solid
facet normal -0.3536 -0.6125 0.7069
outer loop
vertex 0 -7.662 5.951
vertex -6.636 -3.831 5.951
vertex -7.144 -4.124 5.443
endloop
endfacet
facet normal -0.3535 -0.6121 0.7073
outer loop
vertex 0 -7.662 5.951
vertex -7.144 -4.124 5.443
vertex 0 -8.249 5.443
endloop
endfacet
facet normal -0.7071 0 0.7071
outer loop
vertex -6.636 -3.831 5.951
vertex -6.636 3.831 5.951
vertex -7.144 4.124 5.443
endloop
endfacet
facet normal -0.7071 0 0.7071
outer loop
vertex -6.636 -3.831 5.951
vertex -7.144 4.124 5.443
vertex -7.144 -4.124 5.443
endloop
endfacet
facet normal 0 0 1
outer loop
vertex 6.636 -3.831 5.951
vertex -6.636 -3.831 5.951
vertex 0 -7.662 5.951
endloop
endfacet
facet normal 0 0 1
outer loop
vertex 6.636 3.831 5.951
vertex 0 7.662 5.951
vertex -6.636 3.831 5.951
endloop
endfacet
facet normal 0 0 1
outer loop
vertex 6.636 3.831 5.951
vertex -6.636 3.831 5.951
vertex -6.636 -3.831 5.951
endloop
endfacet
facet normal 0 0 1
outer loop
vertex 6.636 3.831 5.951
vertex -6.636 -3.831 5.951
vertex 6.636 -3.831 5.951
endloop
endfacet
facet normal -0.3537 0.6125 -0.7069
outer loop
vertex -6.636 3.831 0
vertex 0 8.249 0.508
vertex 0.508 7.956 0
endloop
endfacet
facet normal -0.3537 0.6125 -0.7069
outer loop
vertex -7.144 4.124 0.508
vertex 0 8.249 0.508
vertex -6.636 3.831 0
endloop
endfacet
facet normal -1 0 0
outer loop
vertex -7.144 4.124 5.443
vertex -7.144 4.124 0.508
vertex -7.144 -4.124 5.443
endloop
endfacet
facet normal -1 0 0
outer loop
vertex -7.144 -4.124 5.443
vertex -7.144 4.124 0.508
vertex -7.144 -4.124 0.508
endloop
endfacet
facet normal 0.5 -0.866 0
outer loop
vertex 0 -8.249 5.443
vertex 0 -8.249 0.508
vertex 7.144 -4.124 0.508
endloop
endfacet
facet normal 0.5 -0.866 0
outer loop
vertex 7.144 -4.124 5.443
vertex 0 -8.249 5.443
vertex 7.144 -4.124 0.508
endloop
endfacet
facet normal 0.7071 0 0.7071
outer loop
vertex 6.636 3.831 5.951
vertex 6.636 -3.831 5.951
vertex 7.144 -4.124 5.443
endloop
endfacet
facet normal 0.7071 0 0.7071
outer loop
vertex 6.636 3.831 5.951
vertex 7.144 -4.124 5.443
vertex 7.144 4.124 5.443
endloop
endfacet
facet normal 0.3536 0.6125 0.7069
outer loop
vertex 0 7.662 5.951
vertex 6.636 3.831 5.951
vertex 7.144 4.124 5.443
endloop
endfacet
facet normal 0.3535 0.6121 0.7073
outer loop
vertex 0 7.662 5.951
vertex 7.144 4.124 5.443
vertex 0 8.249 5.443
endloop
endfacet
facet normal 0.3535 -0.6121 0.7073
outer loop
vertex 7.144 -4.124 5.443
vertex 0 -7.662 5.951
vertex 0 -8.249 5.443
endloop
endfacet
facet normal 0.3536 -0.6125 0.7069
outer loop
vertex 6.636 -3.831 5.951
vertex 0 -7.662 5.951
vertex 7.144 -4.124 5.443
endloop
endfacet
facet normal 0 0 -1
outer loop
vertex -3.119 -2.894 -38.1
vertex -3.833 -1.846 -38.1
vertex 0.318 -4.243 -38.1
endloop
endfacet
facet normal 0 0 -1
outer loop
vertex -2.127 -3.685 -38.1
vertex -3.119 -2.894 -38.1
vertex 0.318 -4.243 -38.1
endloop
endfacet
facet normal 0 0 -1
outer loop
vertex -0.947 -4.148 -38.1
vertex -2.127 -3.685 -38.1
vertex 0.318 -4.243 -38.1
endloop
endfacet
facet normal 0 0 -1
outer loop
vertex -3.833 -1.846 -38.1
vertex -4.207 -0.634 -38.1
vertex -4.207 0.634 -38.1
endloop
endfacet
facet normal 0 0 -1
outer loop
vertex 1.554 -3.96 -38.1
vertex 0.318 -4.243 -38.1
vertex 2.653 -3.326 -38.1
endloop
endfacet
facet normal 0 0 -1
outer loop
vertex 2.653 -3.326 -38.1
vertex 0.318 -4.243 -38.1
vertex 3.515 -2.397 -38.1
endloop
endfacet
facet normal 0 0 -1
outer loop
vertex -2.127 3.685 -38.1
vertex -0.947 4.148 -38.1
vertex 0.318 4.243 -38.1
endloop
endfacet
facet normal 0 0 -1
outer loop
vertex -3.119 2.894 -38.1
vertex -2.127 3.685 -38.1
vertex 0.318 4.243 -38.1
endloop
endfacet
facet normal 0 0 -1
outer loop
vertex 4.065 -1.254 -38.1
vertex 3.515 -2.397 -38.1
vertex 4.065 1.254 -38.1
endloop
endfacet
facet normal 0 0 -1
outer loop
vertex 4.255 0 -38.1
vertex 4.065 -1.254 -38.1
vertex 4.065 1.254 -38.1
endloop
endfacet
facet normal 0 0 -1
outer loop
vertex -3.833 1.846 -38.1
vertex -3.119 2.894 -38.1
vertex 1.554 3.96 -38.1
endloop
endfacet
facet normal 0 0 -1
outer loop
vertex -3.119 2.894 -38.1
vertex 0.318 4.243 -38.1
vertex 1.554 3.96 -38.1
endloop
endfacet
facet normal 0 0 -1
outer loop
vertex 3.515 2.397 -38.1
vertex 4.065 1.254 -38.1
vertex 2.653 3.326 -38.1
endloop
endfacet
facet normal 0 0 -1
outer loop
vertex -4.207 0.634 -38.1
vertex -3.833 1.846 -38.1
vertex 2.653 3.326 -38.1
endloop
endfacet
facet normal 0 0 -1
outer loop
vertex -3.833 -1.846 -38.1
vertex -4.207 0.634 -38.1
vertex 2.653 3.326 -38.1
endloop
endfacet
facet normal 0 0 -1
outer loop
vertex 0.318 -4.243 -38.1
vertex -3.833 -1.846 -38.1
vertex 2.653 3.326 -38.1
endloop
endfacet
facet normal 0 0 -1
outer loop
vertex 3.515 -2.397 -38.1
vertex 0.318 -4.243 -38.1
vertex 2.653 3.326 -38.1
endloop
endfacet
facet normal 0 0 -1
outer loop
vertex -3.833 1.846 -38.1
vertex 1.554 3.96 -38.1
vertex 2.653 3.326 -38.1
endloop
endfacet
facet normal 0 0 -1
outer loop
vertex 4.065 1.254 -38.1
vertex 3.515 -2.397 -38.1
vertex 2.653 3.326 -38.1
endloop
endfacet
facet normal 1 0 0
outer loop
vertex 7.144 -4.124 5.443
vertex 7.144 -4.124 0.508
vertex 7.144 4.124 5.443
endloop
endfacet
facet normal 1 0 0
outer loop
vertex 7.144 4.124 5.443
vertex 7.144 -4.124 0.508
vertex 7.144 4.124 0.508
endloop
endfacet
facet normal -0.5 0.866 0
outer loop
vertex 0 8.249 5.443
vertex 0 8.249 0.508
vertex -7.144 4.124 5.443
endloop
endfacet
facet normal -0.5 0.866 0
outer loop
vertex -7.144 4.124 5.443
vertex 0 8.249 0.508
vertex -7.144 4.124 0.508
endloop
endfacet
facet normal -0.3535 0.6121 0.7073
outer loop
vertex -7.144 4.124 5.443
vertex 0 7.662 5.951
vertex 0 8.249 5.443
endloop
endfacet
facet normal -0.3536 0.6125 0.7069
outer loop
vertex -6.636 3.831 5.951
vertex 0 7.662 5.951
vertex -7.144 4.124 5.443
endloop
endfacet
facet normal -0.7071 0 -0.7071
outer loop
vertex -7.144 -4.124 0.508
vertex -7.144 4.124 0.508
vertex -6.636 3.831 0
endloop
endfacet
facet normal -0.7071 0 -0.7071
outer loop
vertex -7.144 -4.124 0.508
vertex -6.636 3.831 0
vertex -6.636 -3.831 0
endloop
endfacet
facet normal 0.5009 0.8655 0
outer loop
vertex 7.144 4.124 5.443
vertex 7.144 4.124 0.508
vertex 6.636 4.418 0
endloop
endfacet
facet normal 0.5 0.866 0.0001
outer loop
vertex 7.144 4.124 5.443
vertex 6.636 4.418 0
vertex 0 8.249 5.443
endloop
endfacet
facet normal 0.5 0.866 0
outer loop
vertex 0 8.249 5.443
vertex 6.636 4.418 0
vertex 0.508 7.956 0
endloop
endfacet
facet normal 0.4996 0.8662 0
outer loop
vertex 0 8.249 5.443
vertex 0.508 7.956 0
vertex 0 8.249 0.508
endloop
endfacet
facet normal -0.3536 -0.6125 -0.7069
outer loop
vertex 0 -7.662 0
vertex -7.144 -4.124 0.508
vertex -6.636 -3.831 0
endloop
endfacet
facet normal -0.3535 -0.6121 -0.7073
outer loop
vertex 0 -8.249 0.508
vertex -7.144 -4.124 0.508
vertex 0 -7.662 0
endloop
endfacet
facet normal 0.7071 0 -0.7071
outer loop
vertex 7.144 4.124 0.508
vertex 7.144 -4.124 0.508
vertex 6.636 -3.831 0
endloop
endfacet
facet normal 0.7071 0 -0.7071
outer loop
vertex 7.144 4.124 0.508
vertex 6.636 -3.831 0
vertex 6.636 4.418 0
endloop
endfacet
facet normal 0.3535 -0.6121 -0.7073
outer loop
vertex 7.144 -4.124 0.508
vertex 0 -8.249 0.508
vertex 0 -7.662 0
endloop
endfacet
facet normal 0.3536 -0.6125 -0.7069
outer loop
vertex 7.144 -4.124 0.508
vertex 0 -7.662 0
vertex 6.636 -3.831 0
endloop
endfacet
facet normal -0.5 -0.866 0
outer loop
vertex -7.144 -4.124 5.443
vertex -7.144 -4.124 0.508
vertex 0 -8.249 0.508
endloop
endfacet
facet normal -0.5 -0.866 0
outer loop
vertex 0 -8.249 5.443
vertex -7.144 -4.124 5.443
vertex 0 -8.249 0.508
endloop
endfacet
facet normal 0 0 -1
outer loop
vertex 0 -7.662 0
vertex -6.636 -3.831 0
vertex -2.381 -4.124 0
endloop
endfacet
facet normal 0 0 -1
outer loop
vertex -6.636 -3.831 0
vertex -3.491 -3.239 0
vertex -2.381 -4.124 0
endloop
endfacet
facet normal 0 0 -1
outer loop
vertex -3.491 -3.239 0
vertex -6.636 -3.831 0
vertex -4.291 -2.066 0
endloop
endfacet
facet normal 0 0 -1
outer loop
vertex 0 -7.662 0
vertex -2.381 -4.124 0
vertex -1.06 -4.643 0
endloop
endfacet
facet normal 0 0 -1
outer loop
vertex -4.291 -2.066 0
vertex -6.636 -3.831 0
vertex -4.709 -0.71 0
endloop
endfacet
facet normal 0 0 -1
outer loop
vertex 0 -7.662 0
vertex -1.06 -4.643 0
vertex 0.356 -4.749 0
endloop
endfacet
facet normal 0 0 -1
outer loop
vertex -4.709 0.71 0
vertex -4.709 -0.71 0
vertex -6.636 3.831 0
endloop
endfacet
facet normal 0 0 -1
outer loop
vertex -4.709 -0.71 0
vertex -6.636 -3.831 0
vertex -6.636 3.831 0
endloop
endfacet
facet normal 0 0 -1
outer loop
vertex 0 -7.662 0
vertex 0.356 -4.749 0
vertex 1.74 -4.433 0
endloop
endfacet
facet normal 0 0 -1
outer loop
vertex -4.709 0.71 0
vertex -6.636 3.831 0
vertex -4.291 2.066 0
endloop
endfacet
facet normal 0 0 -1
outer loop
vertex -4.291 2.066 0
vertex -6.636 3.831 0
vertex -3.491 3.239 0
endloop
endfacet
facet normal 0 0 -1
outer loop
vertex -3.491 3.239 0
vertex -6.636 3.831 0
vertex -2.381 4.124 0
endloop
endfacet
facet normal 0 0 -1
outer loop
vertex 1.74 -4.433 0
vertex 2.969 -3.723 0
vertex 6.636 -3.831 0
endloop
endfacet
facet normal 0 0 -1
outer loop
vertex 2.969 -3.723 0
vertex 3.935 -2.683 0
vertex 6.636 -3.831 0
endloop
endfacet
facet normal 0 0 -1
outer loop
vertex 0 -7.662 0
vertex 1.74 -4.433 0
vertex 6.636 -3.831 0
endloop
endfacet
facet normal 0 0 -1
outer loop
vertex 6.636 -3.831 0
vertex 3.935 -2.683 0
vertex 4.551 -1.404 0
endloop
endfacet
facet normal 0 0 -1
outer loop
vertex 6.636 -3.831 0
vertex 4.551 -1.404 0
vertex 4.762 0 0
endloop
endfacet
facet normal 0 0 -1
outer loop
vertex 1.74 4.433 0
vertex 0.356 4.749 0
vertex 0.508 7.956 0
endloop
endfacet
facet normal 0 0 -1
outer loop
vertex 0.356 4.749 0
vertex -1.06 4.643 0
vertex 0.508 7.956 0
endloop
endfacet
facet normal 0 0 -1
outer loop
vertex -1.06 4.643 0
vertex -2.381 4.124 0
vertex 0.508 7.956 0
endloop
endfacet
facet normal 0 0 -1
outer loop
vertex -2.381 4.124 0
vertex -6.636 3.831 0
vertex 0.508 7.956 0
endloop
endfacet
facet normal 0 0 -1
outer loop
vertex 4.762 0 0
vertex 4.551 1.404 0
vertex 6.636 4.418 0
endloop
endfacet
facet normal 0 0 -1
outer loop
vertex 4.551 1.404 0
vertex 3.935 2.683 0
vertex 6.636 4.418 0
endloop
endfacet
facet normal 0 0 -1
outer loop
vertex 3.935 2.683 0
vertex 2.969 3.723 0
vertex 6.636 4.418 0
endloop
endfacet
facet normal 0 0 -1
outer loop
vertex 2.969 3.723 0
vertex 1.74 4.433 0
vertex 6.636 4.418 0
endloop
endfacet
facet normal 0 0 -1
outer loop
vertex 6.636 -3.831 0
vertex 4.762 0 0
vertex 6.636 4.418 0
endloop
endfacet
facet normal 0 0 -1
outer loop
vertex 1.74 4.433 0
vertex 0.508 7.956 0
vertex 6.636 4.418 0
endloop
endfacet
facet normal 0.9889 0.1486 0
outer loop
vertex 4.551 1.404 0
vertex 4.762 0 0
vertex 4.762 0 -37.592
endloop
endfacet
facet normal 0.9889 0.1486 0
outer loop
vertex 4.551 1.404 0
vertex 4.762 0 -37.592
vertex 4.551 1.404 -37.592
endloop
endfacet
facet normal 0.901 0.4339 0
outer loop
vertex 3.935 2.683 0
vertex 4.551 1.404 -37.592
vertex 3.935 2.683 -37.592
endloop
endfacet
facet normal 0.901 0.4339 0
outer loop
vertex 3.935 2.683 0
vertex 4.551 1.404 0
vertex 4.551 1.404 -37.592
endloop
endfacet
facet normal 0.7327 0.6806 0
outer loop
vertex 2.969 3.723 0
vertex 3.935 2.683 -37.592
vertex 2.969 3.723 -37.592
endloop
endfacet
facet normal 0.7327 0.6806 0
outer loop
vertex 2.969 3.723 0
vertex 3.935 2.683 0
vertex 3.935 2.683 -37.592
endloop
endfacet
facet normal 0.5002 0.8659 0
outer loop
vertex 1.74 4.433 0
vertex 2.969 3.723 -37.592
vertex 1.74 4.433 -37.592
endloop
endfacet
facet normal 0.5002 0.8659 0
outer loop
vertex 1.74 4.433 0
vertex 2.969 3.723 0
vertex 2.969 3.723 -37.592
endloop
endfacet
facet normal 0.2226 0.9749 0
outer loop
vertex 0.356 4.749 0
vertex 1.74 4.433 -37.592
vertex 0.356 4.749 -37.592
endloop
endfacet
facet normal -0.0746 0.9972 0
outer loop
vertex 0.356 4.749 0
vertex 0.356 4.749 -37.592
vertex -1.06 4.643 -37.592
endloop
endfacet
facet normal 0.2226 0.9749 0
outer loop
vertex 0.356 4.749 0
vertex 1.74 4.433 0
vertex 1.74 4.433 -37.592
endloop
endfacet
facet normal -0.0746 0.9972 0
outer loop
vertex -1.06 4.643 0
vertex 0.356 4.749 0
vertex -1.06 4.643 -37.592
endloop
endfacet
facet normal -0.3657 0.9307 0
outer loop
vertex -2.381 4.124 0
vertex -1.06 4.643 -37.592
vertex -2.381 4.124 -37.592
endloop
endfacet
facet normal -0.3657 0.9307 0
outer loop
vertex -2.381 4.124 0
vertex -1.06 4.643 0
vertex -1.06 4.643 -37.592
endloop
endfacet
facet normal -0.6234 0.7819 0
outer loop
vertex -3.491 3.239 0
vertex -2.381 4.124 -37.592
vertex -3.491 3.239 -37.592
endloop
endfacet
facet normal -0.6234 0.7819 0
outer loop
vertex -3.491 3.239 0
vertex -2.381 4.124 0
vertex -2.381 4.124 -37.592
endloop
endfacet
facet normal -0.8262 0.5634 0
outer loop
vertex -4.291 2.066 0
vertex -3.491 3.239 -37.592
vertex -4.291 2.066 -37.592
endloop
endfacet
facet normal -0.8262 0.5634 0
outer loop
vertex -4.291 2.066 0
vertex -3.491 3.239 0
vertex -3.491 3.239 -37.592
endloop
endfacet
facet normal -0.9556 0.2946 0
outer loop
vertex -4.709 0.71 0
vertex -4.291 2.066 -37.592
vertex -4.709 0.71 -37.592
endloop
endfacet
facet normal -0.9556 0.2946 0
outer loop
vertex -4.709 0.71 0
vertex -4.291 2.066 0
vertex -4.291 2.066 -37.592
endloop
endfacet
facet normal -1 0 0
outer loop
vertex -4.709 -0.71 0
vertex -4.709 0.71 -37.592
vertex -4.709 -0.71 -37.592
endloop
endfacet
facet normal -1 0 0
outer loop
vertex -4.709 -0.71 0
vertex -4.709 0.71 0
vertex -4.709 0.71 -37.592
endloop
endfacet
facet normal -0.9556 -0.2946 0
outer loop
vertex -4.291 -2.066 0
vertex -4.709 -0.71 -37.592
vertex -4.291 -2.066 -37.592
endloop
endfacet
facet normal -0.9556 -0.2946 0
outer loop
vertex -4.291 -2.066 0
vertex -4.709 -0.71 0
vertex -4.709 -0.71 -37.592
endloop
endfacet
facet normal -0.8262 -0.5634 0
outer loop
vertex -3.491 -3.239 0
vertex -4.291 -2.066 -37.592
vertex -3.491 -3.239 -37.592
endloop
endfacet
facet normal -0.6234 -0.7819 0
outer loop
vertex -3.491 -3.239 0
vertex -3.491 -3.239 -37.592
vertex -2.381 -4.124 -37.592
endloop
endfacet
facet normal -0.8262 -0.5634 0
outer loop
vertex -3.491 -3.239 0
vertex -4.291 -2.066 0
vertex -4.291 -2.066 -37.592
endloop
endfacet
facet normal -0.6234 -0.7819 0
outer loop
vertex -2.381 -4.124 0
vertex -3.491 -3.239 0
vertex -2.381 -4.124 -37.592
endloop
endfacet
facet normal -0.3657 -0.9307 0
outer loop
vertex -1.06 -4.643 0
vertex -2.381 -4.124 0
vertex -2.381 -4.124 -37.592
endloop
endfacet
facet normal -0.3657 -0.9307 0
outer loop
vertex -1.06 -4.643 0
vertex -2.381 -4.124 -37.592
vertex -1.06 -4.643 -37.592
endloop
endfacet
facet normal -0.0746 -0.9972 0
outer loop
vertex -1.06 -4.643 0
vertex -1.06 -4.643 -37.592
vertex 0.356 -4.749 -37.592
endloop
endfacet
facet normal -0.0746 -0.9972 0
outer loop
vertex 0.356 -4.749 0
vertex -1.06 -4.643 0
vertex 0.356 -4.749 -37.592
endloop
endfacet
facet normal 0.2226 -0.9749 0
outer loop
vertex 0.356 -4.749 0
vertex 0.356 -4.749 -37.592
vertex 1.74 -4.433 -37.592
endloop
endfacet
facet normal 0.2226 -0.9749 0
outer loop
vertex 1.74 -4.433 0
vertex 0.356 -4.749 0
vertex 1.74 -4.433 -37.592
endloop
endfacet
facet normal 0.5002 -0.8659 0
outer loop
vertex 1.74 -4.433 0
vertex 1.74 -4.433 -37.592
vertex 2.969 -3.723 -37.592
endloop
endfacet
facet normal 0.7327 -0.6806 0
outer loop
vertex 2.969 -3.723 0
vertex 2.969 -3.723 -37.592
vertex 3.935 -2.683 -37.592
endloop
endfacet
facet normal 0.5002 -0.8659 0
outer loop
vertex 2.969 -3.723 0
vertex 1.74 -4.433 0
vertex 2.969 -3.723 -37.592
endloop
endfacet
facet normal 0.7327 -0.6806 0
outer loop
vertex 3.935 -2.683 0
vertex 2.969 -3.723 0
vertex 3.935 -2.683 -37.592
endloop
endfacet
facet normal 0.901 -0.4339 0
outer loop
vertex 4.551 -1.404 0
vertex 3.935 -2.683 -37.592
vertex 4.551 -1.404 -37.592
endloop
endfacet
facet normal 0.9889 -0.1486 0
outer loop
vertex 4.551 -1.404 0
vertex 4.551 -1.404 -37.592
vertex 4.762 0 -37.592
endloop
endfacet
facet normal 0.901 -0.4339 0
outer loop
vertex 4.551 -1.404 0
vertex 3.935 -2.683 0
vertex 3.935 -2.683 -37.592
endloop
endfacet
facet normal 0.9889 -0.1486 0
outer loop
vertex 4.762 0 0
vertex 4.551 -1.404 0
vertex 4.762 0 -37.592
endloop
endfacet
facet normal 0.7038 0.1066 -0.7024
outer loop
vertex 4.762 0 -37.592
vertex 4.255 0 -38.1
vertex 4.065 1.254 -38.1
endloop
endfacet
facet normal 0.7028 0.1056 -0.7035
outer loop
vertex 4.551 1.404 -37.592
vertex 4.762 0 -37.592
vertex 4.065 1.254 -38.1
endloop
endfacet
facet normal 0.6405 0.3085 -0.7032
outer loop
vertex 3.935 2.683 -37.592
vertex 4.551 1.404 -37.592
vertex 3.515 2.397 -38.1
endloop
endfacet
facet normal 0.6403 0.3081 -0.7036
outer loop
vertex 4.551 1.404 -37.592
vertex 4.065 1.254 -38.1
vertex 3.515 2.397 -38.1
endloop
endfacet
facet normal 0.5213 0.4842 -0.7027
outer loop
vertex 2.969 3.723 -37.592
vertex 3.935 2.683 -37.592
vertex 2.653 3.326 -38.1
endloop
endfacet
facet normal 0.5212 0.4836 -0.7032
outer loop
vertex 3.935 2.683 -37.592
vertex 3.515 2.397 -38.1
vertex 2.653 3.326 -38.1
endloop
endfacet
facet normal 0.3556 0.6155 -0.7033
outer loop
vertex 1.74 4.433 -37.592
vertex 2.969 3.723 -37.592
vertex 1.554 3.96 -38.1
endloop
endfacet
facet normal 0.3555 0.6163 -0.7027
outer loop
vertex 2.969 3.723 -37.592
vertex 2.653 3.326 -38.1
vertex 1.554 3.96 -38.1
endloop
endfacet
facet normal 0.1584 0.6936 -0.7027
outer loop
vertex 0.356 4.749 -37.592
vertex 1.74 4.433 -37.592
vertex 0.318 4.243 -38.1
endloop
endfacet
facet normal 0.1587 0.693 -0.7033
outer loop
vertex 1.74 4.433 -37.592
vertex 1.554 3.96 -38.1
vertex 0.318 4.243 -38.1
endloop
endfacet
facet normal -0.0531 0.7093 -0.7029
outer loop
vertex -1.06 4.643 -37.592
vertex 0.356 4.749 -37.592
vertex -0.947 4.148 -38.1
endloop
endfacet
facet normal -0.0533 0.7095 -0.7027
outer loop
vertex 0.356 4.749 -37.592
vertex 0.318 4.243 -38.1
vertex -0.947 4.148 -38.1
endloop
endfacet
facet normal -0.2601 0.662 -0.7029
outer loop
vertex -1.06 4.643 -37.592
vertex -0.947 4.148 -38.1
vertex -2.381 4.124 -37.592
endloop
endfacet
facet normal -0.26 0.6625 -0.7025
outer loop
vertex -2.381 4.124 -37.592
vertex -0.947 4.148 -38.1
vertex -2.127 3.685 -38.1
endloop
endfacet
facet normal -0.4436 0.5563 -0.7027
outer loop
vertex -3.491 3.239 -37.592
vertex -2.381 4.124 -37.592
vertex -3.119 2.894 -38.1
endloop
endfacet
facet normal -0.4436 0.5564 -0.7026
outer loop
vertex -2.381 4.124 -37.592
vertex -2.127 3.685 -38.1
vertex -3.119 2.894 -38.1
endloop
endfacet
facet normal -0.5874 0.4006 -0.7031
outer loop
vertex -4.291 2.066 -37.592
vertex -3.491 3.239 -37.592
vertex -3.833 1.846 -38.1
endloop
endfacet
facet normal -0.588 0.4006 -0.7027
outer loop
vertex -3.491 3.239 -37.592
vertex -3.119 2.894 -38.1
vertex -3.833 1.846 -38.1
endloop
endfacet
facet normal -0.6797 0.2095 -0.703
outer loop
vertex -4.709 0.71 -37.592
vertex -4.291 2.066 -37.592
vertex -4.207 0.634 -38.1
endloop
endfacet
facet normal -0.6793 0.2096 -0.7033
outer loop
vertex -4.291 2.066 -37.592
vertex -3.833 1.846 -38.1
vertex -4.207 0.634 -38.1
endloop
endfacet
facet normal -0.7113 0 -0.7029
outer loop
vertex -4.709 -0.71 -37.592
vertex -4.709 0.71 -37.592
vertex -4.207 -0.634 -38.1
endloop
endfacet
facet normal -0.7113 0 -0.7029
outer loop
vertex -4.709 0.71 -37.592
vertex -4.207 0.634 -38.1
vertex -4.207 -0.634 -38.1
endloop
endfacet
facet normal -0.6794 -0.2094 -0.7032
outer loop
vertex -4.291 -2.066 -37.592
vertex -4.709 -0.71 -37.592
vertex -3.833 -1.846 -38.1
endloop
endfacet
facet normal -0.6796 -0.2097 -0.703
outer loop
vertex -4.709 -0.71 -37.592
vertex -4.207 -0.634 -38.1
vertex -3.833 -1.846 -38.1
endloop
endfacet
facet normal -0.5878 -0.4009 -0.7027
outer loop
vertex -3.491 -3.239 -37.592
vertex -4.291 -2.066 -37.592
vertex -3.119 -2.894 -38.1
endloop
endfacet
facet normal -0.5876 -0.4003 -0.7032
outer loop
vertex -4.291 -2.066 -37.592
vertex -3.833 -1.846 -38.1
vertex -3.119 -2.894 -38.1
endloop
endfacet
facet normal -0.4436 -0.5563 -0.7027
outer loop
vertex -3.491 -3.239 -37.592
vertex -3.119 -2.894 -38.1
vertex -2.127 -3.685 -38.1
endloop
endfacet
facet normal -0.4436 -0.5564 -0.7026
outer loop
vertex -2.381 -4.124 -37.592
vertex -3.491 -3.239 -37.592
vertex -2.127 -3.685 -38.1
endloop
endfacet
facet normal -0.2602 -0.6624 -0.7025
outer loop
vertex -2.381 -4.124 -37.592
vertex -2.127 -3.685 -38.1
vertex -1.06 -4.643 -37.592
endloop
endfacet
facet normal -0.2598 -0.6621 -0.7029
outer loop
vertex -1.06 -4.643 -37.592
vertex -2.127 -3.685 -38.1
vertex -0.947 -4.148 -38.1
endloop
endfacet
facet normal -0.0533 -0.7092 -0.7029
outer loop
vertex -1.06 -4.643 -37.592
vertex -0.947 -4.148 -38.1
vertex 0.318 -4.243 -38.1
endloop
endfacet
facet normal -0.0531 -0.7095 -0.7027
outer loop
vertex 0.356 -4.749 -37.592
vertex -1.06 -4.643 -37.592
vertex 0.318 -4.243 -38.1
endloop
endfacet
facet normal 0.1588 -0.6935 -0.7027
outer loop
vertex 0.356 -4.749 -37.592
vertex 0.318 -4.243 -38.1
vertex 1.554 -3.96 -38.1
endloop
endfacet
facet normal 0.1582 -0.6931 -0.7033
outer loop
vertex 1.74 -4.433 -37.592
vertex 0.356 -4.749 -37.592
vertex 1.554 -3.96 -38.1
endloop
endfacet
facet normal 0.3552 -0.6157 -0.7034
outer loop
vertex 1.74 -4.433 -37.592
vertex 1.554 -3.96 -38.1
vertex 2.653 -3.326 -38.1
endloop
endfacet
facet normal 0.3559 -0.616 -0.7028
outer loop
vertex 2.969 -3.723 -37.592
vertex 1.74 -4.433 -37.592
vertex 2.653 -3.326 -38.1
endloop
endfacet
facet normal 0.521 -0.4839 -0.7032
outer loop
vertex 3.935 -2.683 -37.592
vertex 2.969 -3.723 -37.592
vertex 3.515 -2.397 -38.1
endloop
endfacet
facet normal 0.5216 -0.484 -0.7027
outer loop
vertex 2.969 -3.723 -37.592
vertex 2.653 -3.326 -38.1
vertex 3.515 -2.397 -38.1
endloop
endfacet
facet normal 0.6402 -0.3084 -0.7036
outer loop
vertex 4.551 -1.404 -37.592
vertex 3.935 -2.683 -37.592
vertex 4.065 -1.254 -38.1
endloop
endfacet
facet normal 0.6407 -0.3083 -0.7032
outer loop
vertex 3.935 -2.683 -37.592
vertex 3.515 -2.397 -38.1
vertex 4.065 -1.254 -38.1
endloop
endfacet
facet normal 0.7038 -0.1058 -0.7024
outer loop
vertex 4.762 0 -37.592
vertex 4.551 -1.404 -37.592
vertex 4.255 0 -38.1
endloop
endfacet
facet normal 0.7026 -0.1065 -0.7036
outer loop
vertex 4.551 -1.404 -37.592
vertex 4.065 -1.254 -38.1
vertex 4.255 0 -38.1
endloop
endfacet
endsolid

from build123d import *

# Parameters (mm, degrees)
F0_R     = 4.7625
F1_DEPTH = 5.95122
F2_DEPTH = 38.1
F3_SIZE  = 0.508
F4_SIZE  = 0.508


with BuildPart() as f1:
    # F0 (on Top) → F1 (new body)
    with BuildSketch(Plane.XY):
        Polygon((7.14375, -4.124446), (7.14375, 4.124446), (0, 8.248892), (-7.14375, 4.124446), (-7.14375, -4.124446), (0, -8.248892), align=None)
        Circle(F0_R, mode=Mode.SUBTRACT)
        Circle(F0_R)
    extrude(amount=F1_DEPTH)

    # F0 (on Top) → F2 (join)
    with BuildSketch(Plane.XY):
        Circle(F0_R)
    extrude(amount=-F2_DEPTH)

    # F3
    f3_edges = [f1.edges().sort_by_distance(p)[0] for p in [
        (-4.7625, 0, -38.1),
    ]]
    chamfer(f3_edges, length=F3_SIZE)

    # F4
    f4_edges = [f1.edges().sort_by_distance(p)[0] for p in [
        (3.571875, -6.186669, 5.95122),
        (7.14375, 0, 5.95122),
        (3.571875, 6.186669, 5.95122),
        (-3.571875, 6.186669, 5.95122),
        (-7.14375, 0, 5.95122),
        (-3.571875, -6.186669, 5.95122),
        (-3.571875, -6.186669, 0),
        (3.571875, -6.186669, 0),
        (7.14375, 0, 0),
        (-7.14375, 0, 0),
        (-3.571875, 6.186669, 0),
    ]]
    chamfer(f4_edges, length=F4_SIZE)


solid = f1.part
